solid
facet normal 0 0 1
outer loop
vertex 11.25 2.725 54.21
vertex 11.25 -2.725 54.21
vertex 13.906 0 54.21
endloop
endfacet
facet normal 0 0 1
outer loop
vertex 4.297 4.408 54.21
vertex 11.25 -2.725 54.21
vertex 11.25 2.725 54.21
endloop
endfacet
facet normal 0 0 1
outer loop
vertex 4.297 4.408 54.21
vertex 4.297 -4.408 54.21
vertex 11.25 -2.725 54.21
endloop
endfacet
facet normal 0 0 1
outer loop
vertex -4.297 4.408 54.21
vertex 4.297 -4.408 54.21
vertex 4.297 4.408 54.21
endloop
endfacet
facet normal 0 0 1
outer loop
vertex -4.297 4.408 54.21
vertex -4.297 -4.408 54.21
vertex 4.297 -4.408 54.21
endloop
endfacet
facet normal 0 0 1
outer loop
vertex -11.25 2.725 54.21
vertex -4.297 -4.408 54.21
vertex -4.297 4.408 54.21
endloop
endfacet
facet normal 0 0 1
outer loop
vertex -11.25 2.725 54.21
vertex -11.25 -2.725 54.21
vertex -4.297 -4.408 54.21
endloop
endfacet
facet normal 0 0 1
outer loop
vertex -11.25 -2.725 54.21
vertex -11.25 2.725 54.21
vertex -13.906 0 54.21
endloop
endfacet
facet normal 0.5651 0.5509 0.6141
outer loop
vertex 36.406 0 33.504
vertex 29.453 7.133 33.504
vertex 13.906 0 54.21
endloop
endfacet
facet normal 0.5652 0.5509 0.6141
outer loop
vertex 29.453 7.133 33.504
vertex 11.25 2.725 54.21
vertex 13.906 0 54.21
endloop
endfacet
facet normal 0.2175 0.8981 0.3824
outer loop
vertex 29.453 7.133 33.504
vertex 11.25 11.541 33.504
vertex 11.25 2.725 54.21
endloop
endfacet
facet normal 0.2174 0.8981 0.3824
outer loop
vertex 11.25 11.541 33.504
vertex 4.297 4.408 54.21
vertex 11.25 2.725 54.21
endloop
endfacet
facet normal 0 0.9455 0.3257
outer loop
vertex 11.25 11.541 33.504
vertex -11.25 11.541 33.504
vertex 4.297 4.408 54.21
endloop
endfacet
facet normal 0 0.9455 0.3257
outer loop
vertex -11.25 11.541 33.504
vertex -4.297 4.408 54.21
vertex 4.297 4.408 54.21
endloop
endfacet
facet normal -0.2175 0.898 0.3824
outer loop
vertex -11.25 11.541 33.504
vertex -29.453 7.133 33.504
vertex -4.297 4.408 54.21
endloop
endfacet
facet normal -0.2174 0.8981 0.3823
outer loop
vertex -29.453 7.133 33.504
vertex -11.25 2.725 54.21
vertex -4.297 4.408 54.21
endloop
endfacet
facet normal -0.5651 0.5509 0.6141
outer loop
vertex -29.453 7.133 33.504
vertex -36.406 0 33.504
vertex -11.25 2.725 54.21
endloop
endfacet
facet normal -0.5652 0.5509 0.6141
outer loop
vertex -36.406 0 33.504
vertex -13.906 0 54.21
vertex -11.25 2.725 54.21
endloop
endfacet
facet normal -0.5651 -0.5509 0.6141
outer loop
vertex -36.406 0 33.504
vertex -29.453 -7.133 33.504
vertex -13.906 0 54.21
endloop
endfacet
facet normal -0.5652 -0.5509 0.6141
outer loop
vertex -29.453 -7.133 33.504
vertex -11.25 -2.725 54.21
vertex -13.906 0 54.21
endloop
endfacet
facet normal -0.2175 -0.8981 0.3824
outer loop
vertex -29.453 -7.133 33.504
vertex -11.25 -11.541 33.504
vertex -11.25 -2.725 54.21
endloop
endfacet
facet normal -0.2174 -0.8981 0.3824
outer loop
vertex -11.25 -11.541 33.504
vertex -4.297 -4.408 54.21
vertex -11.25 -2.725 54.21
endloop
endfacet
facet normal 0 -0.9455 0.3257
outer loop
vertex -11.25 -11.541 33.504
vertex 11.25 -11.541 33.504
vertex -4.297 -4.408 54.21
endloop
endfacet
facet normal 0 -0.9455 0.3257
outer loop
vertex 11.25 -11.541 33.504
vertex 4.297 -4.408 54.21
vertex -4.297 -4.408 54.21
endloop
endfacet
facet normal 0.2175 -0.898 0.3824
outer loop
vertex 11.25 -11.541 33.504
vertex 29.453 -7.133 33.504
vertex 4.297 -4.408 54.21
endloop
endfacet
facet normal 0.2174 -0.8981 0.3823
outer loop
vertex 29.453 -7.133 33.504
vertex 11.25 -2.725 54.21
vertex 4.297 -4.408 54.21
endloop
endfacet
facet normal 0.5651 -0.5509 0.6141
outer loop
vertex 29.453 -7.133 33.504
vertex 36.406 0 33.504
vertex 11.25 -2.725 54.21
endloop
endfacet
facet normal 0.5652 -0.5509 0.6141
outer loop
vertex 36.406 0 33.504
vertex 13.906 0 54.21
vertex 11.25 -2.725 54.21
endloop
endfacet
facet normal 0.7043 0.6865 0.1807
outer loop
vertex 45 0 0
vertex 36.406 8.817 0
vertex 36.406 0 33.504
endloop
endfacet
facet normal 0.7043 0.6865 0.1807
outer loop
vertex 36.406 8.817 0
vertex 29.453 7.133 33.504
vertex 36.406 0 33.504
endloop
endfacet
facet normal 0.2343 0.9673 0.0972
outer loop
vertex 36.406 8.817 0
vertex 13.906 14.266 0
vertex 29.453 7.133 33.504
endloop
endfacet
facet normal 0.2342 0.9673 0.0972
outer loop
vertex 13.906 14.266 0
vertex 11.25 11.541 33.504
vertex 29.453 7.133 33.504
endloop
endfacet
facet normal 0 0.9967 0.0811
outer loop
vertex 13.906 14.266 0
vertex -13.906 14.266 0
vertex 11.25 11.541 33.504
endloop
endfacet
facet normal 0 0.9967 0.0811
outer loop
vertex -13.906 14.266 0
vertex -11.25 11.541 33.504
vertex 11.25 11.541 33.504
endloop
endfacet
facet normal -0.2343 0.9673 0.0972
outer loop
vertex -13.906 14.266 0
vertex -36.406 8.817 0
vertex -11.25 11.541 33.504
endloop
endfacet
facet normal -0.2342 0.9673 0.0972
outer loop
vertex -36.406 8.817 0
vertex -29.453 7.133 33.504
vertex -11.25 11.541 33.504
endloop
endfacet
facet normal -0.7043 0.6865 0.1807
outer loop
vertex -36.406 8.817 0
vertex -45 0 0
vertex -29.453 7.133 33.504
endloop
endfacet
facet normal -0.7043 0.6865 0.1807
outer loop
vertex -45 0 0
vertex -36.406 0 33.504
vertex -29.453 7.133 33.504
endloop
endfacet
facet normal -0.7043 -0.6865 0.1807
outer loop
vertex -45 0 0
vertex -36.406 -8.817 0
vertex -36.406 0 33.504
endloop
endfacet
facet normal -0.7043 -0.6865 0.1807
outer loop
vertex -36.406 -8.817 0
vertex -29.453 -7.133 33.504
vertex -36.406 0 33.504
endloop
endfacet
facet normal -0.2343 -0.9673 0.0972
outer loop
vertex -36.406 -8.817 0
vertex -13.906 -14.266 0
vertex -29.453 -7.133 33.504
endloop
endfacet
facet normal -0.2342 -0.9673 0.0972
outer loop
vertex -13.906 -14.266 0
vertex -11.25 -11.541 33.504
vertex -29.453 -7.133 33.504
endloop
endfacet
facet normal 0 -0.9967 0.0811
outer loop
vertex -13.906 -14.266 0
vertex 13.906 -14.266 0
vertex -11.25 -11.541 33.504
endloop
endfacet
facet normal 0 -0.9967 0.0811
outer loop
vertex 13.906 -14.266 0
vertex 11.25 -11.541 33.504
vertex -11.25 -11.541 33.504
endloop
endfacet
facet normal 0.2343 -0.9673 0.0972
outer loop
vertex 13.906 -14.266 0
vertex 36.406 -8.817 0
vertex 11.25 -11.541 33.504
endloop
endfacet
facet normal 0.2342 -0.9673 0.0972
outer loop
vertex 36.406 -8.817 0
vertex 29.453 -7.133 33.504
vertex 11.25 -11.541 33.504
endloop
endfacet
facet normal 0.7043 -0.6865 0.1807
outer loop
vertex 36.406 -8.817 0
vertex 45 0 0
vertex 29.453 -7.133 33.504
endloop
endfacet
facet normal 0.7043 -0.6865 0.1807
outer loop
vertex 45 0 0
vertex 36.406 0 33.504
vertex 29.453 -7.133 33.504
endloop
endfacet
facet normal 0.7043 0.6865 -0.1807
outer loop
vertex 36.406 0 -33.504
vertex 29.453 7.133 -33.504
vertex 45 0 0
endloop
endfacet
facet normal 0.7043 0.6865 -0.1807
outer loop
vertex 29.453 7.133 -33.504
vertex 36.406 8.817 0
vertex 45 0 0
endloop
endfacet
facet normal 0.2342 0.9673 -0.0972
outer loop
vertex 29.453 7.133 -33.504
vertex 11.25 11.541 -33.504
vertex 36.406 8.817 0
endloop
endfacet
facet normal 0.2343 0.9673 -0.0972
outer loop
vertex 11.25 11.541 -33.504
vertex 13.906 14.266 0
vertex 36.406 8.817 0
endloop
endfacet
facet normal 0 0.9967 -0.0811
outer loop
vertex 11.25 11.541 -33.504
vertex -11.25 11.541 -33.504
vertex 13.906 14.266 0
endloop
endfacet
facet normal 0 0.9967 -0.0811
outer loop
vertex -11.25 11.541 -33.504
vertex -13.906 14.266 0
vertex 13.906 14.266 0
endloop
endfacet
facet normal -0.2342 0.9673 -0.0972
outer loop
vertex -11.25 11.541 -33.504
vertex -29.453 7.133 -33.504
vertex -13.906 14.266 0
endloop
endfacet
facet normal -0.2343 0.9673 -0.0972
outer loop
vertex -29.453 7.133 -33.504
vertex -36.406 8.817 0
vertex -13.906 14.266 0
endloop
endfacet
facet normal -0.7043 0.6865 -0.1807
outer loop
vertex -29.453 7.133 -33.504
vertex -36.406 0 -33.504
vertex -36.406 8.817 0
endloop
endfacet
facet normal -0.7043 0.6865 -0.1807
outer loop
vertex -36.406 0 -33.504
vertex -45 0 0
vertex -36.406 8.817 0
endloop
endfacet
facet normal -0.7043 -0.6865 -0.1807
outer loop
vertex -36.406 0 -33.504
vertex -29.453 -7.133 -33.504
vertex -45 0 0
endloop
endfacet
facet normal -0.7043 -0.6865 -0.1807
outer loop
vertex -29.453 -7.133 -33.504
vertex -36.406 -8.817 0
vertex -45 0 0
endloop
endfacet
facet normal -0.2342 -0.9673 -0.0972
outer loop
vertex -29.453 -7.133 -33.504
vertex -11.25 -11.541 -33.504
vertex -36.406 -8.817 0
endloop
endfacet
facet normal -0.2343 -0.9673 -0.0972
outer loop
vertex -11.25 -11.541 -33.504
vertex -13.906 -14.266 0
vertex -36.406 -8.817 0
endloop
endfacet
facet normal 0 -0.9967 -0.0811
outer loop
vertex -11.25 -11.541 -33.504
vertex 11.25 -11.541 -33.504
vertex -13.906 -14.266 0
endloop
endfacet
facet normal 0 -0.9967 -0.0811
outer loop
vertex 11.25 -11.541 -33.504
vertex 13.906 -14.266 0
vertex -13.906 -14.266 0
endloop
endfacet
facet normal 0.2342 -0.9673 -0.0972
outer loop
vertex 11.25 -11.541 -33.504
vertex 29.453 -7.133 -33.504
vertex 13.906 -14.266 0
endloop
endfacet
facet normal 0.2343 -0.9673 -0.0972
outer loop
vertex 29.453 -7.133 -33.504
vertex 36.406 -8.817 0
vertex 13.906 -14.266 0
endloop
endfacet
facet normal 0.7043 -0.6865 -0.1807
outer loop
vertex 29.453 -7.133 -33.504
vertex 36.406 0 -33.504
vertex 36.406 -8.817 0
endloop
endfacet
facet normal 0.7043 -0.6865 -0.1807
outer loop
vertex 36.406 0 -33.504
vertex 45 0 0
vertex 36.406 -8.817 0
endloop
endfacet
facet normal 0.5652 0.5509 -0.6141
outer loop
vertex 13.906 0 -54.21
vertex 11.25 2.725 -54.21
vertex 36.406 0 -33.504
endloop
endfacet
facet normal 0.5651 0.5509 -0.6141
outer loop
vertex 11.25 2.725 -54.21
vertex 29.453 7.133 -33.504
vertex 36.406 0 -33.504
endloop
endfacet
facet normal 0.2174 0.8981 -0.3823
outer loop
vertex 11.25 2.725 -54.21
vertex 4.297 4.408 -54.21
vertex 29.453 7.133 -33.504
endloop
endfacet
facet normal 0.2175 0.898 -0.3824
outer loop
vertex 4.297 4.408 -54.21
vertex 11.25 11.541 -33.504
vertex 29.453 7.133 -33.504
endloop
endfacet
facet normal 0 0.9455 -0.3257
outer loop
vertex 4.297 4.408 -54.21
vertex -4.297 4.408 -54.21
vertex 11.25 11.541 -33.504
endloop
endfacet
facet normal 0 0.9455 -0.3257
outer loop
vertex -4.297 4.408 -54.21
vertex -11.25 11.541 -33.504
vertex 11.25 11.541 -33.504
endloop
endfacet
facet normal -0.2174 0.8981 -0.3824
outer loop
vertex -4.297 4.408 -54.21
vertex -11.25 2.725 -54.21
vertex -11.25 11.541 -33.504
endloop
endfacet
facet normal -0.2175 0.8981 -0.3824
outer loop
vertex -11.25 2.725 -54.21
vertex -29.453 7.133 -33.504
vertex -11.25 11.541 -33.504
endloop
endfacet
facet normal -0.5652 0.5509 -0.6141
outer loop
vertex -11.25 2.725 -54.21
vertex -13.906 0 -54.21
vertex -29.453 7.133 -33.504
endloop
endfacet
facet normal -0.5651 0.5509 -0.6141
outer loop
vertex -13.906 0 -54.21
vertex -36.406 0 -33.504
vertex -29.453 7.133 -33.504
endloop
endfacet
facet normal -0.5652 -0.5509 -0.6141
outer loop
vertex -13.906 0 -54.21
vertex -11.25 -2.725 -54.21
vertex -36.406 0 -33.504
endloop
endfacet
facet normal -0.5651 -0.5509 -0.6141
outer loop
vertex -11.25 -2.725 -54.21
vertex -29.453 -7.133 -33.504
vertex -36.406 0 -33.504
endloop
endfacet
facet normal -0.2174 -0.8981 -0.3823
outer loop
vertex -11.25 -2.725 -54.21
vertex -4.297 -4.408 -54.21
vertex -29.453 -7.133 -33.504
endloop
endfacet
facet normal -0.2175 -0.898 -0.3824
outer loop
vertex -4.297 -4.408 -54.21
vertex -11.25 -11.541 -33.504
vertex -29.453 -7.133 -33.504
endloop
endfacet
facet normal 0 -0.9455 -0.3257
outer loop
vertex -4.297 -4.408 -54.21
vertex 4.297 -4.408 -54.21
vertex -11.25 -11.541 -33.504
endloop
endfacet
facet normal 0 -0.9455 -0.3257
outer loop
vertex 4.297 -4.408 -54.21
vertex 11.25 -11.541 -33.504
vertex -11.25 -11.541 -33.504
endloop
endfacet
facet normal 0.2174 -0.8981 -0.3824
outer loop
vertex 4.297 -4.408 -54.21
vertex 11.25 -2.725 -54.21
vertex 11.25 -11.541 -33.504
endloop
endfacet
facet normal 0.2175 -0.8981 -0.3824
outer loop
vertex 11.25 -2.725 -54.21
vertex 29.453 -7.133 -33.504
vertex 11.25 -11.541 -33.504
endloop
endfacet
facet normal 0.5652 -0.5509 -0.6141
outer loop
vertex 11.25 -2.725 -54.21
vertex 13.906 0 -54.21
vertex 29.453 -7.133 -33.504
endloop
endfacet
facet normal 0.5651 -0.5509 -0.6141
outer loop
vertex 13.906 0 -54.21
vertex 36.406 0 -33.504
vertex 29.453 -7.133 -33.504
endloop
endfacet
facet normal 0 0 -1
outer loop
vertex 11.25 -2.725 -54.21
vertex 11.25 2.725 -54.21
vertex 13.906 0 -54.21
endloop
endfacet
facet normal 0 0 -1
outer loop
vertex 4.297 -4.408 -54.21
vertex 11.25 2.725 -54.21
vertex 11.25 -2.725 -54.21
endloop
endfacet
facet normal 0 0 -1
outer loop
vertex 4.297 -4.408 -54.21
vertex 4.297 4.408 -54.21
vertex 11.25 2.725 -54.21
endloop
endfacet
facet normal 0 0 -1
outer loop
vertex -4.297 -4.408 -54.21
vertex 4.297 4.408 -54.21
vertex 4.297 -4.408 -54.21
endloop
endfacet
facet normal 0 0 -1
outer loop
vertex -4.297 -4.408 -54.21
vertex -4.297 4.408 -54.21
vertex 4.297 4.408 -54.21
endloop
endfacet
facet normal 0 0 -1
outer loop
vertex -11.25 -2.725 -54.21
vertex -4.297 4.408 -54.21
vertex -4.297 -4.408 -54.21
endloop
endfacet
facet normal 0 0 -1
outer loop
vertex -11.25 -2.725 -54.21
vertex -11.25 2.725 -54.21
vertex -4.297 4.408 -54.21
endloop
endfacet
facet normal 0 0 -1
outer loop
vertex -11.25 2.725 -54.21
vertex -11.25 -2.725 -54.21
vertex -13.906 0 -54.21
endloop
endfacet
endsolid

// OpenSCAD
// Generated by SolidPython 1.0.1 on 2020-07-29 00:46:51


scale(v = [15, 5, 19]) {
	sphere(r = 3);
}
/***********************************************
*********      SolidPython code:      **********
************************************************
 
# import packages: SolidPython
from solid import *
from solid.utils import *
from itertools import chain, combinations, permutations


class Resize:

    def __init__(self, scad_file):
        self.scad_file = scad_file
        #self.scad_file = import_scad(scad_file)
        # cone/cylinder param:
        self.r1 = 0
        self.r2 = 0
        self.h = 0
        # rectangular prism param:
        self.w = 0
        self.l = 0
        # ellipse param:
        self.r = 0

    # import OpenScad code (file name corresponds to shape)


    # classify shape + parameters
    def assign(self, param1, param2, param3):
        if self.scad_file == 'cone.scad':
            self.r1 = param1
            self.r2 = param2
            self.h = param3
        elif self.scad_file == 'cylinder.scad':
            self.r1 = param1
            self.r2 = param2
            self.h = param3
        elif self.scad_file == 'rectangularPrism.scad':
            self.h = param1
            self.l = param2
            self.w = param3
        else:
            self.r = param1
            self.h = param2

    # resize parameters
    def iterate(self):
        x = range(3, 20, 2)
        i = 1
        if self.scad_file == 'cone.scad':
            tempList = list(permutations(x, 2))
            for temp in tempList:
                param1 = temp[0]
                param2 = temp[1]
                filepath = 'produced_scad_files/' + 'cone' + str(param1) + '_' + str(param2) + '_' + '.scad'
                scad_render_to_file(cylinder(h=param1, r1=param2, r2=0), filepath)

        elif self.scad_file == 'cylinder.scad':
            tempList = list(permutations(x, 3))
            for temp in tempList:
                param1 = temp[0]
                param2 = temp[1]
                filepath = 'produced_scad_files/' + 'cylinder' + str(param1) + '_' + str(param2) + '_' + '.scad'
                scad_render_to_file(cylinder(h=param1, r1=param2, r2=param2), filepath)

        elif self.scad_file == 'rectangularPrism.scad':
            tempList = list(permutations(x, 3))
            for temp in tempList:
                param1 = temp[0]
                param2 = temp[1]
                param3 = temp[2]
                filepath = 'produced_scad_files/' + 'rectangularPrism' + str(param1) + '_' + str(param2) + '_' + str(
                    param3) + '.scad'
                scad_render_to_file(cube(size=(param1, param2, param3)), filepath)

        elif self.scad_file == 'ellipse.scad':
            tempList = list(permutations(x, 4))
            for temp in tempList:
                param1 = temp[0]
                param2 = temp[1]
                param3 = temp[2]
                param4 = temp[3]
                filepath = 'produced_scad_files/' + 'ellipse' + str(param1) + '_' + str(param2) + '_' + str(param3) + '_' + str(param4) + '.scad'
                scad_render_to_file(scale([param1, param2, param3])(sphere(r=param4)), filepath)

    def render_to_scadfile(self):
        scad_render_to_file(scad, 'example.scad') 
 
************************************************/
